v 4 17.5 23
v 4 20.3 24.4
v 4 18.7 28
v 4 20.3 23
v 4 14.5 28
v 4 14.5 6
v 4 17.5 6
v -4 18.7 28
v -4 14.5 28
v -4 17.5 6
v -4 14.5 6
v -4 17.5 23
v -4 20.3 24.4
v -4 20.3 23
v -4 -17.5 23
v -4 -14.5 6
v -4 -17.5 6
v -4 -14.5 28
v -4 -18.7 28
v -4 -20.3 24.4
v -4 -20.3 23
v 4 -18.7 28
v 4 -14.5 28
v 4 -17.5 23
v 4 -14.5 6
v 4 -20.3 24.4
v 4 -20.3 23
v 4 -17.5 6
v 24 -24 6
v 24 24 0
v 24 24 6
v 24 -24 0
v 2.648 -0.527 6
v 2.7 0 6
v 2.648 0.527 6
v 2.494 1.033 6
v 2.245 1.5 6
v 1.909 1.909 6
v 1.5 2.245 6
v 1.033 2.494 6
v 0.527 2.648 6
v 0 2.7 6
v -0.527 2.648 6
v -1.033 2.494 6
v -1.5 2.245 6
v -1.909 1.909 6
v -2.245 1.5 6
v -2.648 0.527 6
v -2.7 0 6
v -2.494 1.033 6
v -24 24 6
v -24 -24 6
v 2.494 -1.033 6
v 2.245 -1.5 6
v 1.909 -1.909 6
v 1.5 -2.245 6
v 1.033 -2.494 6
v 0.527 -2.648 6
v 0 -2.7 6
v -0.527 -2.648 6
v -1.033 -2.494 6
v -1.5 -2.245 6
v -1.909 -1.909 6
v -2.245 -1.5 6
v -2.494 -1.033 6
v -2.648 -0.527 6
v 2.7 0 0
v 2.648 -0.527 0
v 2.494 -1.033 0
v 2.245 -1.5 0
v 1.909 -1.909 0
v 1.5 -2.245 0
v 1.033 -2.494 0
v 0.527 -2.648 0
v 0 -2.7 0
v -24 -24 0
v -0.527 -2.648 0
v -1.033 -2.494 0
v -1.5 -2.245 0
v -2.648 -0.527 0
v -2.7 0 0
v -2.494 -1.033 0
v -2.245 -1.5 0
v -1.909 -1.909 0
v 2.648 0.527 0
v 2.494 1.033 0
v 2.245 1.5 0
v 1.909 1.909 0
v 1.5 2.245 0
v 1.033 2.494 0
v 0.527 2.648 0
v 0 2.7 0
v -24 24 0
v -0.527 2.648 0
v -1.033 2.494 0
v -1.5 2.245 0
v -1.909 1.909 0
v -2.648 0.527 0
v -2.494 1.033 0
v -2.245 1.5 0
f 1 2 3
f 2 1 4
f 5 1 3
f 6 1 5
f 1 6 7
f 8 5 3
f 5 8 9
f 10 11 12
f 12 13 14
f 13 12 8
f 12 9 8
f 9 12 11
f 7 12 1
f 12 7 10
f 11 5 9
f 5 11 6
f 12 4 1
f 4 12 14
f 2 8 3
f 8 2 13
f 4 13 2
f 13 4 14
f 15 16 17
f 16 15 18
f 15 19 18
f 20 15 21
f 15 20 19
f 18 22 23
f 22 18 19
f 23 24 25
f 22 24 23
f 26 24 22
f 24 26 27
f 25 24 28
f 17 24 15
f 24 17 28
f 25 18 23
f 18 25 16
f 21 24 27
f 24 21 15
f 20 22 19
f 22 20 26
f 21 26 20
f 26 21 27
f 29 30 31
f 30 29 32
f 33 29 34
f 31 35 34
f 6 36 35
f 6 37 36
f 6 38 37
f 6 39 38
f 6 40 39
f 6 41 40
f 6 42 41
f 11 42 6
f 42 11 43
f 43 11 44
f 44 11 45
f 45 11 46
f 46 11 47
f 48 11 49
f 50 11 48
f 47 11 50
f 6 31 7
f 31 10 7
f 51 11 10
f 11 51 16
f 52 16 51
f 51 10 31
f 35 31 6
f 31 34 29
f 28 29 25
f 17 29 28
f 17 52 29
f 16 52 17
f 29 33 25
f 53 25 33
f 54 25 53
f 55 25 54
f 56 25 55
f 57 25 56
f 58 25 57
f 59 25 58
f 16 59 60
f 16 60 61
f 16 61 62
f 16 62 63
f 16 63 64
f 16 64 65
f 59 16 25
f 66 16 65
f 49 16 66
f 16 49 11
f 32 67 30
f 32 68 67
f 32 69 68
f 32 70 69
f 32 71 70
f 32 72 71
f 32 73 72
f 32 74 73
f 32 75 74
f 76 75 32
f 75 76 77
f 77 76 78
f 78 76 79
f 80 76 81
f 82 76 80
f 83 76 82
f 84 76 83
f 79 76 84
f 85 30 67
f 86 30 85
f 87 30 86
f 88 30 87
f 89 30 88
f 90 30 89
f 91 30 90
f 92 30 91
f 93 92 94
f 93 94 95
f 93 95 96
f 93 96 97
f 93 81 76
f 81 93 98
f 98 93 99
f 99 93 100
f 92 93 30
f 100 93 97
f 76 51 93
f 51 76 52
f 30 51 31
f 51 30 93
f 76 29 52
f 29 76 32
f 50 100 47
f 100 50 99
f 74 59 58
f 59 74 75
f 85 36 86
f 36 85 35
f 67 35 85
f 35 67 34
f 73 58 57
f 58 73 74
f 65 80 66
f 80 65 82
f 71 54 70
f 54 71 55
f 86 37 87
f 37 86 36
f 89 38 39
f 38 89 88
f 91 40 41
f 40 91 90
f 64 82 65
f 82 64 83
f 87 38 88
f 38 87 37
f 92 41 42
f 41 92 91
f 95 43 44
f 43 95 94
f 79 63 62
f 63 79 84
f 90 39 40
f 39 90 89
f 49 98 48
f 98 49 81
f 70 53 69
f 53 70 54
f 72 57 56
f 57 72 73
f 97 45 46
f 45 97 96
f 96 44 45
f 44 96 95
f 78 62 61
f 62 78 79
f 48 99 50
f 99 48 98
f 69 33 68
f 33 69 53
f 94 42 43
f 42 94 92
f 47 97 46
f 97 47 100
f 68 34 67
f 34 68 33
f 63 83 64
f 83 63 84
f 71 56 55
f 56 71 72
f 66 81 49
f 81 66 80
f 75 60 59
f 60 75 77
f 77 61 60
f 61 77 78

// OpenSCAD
$fn = 32;

// ----------------------------------------------------------------------
// Snap-fit latch: 2 arms, 22 mm tall, 3 mm undercut hooks
// ----------------------------------------------------------------------

// --- parameters (mm) ---
base_d = 48;              // base plate depth
base_h = 6;               // base plate thickness
span = 32;                // distance between opposite arms
arm_t = 3;                // arm thickness
arm_d = 8;                // arm width
height = 22;              // free arm length
head_len = 3;             // hook reach
head_h = 5;               // hook height
lead = 1.4;               // lead-in ramp thickness
bore_d = 5.4;             // base fixing bore
top_z = 28;               // height of the arm tips above the base

arms = 2;

difference() {
  union() {
    /* base plate, centred on the arm ring */
    translate([-24, -24, 0]) cube([base_d, base_d, base_h]);
    for (a = [0 : 360 / arms : 359]) rotate([0, 0, a]) {
    /* arm, sunk 0.5 mm into the base */
    translate([-arm_d / 2, span / 2 - arm_t / 2, base_h - 0.5]) cube([arm_d, arm_t, height + 0.5]);
    /* hook: a convex hull of a tall inner block and a thin outer lip
       gives a flat undercut below and a lead-in ramp on top */
    hull() {
      translate([-arm_d / 2, span / 2 + arm_t / 2 - 0.6, top_z - head_h]) cube([arm_d, lead + 0.4, head_h]);
      translate([-arm_d / 2, span / 2 + arm_t / 2 - 0.2, top_z - head_h]) cube([arm_d, head_len, lead]);
    }
    }
  }
  translate([0, 0, -2.5]) cylinder(h = base_h + 5, d = bore_d);
}
